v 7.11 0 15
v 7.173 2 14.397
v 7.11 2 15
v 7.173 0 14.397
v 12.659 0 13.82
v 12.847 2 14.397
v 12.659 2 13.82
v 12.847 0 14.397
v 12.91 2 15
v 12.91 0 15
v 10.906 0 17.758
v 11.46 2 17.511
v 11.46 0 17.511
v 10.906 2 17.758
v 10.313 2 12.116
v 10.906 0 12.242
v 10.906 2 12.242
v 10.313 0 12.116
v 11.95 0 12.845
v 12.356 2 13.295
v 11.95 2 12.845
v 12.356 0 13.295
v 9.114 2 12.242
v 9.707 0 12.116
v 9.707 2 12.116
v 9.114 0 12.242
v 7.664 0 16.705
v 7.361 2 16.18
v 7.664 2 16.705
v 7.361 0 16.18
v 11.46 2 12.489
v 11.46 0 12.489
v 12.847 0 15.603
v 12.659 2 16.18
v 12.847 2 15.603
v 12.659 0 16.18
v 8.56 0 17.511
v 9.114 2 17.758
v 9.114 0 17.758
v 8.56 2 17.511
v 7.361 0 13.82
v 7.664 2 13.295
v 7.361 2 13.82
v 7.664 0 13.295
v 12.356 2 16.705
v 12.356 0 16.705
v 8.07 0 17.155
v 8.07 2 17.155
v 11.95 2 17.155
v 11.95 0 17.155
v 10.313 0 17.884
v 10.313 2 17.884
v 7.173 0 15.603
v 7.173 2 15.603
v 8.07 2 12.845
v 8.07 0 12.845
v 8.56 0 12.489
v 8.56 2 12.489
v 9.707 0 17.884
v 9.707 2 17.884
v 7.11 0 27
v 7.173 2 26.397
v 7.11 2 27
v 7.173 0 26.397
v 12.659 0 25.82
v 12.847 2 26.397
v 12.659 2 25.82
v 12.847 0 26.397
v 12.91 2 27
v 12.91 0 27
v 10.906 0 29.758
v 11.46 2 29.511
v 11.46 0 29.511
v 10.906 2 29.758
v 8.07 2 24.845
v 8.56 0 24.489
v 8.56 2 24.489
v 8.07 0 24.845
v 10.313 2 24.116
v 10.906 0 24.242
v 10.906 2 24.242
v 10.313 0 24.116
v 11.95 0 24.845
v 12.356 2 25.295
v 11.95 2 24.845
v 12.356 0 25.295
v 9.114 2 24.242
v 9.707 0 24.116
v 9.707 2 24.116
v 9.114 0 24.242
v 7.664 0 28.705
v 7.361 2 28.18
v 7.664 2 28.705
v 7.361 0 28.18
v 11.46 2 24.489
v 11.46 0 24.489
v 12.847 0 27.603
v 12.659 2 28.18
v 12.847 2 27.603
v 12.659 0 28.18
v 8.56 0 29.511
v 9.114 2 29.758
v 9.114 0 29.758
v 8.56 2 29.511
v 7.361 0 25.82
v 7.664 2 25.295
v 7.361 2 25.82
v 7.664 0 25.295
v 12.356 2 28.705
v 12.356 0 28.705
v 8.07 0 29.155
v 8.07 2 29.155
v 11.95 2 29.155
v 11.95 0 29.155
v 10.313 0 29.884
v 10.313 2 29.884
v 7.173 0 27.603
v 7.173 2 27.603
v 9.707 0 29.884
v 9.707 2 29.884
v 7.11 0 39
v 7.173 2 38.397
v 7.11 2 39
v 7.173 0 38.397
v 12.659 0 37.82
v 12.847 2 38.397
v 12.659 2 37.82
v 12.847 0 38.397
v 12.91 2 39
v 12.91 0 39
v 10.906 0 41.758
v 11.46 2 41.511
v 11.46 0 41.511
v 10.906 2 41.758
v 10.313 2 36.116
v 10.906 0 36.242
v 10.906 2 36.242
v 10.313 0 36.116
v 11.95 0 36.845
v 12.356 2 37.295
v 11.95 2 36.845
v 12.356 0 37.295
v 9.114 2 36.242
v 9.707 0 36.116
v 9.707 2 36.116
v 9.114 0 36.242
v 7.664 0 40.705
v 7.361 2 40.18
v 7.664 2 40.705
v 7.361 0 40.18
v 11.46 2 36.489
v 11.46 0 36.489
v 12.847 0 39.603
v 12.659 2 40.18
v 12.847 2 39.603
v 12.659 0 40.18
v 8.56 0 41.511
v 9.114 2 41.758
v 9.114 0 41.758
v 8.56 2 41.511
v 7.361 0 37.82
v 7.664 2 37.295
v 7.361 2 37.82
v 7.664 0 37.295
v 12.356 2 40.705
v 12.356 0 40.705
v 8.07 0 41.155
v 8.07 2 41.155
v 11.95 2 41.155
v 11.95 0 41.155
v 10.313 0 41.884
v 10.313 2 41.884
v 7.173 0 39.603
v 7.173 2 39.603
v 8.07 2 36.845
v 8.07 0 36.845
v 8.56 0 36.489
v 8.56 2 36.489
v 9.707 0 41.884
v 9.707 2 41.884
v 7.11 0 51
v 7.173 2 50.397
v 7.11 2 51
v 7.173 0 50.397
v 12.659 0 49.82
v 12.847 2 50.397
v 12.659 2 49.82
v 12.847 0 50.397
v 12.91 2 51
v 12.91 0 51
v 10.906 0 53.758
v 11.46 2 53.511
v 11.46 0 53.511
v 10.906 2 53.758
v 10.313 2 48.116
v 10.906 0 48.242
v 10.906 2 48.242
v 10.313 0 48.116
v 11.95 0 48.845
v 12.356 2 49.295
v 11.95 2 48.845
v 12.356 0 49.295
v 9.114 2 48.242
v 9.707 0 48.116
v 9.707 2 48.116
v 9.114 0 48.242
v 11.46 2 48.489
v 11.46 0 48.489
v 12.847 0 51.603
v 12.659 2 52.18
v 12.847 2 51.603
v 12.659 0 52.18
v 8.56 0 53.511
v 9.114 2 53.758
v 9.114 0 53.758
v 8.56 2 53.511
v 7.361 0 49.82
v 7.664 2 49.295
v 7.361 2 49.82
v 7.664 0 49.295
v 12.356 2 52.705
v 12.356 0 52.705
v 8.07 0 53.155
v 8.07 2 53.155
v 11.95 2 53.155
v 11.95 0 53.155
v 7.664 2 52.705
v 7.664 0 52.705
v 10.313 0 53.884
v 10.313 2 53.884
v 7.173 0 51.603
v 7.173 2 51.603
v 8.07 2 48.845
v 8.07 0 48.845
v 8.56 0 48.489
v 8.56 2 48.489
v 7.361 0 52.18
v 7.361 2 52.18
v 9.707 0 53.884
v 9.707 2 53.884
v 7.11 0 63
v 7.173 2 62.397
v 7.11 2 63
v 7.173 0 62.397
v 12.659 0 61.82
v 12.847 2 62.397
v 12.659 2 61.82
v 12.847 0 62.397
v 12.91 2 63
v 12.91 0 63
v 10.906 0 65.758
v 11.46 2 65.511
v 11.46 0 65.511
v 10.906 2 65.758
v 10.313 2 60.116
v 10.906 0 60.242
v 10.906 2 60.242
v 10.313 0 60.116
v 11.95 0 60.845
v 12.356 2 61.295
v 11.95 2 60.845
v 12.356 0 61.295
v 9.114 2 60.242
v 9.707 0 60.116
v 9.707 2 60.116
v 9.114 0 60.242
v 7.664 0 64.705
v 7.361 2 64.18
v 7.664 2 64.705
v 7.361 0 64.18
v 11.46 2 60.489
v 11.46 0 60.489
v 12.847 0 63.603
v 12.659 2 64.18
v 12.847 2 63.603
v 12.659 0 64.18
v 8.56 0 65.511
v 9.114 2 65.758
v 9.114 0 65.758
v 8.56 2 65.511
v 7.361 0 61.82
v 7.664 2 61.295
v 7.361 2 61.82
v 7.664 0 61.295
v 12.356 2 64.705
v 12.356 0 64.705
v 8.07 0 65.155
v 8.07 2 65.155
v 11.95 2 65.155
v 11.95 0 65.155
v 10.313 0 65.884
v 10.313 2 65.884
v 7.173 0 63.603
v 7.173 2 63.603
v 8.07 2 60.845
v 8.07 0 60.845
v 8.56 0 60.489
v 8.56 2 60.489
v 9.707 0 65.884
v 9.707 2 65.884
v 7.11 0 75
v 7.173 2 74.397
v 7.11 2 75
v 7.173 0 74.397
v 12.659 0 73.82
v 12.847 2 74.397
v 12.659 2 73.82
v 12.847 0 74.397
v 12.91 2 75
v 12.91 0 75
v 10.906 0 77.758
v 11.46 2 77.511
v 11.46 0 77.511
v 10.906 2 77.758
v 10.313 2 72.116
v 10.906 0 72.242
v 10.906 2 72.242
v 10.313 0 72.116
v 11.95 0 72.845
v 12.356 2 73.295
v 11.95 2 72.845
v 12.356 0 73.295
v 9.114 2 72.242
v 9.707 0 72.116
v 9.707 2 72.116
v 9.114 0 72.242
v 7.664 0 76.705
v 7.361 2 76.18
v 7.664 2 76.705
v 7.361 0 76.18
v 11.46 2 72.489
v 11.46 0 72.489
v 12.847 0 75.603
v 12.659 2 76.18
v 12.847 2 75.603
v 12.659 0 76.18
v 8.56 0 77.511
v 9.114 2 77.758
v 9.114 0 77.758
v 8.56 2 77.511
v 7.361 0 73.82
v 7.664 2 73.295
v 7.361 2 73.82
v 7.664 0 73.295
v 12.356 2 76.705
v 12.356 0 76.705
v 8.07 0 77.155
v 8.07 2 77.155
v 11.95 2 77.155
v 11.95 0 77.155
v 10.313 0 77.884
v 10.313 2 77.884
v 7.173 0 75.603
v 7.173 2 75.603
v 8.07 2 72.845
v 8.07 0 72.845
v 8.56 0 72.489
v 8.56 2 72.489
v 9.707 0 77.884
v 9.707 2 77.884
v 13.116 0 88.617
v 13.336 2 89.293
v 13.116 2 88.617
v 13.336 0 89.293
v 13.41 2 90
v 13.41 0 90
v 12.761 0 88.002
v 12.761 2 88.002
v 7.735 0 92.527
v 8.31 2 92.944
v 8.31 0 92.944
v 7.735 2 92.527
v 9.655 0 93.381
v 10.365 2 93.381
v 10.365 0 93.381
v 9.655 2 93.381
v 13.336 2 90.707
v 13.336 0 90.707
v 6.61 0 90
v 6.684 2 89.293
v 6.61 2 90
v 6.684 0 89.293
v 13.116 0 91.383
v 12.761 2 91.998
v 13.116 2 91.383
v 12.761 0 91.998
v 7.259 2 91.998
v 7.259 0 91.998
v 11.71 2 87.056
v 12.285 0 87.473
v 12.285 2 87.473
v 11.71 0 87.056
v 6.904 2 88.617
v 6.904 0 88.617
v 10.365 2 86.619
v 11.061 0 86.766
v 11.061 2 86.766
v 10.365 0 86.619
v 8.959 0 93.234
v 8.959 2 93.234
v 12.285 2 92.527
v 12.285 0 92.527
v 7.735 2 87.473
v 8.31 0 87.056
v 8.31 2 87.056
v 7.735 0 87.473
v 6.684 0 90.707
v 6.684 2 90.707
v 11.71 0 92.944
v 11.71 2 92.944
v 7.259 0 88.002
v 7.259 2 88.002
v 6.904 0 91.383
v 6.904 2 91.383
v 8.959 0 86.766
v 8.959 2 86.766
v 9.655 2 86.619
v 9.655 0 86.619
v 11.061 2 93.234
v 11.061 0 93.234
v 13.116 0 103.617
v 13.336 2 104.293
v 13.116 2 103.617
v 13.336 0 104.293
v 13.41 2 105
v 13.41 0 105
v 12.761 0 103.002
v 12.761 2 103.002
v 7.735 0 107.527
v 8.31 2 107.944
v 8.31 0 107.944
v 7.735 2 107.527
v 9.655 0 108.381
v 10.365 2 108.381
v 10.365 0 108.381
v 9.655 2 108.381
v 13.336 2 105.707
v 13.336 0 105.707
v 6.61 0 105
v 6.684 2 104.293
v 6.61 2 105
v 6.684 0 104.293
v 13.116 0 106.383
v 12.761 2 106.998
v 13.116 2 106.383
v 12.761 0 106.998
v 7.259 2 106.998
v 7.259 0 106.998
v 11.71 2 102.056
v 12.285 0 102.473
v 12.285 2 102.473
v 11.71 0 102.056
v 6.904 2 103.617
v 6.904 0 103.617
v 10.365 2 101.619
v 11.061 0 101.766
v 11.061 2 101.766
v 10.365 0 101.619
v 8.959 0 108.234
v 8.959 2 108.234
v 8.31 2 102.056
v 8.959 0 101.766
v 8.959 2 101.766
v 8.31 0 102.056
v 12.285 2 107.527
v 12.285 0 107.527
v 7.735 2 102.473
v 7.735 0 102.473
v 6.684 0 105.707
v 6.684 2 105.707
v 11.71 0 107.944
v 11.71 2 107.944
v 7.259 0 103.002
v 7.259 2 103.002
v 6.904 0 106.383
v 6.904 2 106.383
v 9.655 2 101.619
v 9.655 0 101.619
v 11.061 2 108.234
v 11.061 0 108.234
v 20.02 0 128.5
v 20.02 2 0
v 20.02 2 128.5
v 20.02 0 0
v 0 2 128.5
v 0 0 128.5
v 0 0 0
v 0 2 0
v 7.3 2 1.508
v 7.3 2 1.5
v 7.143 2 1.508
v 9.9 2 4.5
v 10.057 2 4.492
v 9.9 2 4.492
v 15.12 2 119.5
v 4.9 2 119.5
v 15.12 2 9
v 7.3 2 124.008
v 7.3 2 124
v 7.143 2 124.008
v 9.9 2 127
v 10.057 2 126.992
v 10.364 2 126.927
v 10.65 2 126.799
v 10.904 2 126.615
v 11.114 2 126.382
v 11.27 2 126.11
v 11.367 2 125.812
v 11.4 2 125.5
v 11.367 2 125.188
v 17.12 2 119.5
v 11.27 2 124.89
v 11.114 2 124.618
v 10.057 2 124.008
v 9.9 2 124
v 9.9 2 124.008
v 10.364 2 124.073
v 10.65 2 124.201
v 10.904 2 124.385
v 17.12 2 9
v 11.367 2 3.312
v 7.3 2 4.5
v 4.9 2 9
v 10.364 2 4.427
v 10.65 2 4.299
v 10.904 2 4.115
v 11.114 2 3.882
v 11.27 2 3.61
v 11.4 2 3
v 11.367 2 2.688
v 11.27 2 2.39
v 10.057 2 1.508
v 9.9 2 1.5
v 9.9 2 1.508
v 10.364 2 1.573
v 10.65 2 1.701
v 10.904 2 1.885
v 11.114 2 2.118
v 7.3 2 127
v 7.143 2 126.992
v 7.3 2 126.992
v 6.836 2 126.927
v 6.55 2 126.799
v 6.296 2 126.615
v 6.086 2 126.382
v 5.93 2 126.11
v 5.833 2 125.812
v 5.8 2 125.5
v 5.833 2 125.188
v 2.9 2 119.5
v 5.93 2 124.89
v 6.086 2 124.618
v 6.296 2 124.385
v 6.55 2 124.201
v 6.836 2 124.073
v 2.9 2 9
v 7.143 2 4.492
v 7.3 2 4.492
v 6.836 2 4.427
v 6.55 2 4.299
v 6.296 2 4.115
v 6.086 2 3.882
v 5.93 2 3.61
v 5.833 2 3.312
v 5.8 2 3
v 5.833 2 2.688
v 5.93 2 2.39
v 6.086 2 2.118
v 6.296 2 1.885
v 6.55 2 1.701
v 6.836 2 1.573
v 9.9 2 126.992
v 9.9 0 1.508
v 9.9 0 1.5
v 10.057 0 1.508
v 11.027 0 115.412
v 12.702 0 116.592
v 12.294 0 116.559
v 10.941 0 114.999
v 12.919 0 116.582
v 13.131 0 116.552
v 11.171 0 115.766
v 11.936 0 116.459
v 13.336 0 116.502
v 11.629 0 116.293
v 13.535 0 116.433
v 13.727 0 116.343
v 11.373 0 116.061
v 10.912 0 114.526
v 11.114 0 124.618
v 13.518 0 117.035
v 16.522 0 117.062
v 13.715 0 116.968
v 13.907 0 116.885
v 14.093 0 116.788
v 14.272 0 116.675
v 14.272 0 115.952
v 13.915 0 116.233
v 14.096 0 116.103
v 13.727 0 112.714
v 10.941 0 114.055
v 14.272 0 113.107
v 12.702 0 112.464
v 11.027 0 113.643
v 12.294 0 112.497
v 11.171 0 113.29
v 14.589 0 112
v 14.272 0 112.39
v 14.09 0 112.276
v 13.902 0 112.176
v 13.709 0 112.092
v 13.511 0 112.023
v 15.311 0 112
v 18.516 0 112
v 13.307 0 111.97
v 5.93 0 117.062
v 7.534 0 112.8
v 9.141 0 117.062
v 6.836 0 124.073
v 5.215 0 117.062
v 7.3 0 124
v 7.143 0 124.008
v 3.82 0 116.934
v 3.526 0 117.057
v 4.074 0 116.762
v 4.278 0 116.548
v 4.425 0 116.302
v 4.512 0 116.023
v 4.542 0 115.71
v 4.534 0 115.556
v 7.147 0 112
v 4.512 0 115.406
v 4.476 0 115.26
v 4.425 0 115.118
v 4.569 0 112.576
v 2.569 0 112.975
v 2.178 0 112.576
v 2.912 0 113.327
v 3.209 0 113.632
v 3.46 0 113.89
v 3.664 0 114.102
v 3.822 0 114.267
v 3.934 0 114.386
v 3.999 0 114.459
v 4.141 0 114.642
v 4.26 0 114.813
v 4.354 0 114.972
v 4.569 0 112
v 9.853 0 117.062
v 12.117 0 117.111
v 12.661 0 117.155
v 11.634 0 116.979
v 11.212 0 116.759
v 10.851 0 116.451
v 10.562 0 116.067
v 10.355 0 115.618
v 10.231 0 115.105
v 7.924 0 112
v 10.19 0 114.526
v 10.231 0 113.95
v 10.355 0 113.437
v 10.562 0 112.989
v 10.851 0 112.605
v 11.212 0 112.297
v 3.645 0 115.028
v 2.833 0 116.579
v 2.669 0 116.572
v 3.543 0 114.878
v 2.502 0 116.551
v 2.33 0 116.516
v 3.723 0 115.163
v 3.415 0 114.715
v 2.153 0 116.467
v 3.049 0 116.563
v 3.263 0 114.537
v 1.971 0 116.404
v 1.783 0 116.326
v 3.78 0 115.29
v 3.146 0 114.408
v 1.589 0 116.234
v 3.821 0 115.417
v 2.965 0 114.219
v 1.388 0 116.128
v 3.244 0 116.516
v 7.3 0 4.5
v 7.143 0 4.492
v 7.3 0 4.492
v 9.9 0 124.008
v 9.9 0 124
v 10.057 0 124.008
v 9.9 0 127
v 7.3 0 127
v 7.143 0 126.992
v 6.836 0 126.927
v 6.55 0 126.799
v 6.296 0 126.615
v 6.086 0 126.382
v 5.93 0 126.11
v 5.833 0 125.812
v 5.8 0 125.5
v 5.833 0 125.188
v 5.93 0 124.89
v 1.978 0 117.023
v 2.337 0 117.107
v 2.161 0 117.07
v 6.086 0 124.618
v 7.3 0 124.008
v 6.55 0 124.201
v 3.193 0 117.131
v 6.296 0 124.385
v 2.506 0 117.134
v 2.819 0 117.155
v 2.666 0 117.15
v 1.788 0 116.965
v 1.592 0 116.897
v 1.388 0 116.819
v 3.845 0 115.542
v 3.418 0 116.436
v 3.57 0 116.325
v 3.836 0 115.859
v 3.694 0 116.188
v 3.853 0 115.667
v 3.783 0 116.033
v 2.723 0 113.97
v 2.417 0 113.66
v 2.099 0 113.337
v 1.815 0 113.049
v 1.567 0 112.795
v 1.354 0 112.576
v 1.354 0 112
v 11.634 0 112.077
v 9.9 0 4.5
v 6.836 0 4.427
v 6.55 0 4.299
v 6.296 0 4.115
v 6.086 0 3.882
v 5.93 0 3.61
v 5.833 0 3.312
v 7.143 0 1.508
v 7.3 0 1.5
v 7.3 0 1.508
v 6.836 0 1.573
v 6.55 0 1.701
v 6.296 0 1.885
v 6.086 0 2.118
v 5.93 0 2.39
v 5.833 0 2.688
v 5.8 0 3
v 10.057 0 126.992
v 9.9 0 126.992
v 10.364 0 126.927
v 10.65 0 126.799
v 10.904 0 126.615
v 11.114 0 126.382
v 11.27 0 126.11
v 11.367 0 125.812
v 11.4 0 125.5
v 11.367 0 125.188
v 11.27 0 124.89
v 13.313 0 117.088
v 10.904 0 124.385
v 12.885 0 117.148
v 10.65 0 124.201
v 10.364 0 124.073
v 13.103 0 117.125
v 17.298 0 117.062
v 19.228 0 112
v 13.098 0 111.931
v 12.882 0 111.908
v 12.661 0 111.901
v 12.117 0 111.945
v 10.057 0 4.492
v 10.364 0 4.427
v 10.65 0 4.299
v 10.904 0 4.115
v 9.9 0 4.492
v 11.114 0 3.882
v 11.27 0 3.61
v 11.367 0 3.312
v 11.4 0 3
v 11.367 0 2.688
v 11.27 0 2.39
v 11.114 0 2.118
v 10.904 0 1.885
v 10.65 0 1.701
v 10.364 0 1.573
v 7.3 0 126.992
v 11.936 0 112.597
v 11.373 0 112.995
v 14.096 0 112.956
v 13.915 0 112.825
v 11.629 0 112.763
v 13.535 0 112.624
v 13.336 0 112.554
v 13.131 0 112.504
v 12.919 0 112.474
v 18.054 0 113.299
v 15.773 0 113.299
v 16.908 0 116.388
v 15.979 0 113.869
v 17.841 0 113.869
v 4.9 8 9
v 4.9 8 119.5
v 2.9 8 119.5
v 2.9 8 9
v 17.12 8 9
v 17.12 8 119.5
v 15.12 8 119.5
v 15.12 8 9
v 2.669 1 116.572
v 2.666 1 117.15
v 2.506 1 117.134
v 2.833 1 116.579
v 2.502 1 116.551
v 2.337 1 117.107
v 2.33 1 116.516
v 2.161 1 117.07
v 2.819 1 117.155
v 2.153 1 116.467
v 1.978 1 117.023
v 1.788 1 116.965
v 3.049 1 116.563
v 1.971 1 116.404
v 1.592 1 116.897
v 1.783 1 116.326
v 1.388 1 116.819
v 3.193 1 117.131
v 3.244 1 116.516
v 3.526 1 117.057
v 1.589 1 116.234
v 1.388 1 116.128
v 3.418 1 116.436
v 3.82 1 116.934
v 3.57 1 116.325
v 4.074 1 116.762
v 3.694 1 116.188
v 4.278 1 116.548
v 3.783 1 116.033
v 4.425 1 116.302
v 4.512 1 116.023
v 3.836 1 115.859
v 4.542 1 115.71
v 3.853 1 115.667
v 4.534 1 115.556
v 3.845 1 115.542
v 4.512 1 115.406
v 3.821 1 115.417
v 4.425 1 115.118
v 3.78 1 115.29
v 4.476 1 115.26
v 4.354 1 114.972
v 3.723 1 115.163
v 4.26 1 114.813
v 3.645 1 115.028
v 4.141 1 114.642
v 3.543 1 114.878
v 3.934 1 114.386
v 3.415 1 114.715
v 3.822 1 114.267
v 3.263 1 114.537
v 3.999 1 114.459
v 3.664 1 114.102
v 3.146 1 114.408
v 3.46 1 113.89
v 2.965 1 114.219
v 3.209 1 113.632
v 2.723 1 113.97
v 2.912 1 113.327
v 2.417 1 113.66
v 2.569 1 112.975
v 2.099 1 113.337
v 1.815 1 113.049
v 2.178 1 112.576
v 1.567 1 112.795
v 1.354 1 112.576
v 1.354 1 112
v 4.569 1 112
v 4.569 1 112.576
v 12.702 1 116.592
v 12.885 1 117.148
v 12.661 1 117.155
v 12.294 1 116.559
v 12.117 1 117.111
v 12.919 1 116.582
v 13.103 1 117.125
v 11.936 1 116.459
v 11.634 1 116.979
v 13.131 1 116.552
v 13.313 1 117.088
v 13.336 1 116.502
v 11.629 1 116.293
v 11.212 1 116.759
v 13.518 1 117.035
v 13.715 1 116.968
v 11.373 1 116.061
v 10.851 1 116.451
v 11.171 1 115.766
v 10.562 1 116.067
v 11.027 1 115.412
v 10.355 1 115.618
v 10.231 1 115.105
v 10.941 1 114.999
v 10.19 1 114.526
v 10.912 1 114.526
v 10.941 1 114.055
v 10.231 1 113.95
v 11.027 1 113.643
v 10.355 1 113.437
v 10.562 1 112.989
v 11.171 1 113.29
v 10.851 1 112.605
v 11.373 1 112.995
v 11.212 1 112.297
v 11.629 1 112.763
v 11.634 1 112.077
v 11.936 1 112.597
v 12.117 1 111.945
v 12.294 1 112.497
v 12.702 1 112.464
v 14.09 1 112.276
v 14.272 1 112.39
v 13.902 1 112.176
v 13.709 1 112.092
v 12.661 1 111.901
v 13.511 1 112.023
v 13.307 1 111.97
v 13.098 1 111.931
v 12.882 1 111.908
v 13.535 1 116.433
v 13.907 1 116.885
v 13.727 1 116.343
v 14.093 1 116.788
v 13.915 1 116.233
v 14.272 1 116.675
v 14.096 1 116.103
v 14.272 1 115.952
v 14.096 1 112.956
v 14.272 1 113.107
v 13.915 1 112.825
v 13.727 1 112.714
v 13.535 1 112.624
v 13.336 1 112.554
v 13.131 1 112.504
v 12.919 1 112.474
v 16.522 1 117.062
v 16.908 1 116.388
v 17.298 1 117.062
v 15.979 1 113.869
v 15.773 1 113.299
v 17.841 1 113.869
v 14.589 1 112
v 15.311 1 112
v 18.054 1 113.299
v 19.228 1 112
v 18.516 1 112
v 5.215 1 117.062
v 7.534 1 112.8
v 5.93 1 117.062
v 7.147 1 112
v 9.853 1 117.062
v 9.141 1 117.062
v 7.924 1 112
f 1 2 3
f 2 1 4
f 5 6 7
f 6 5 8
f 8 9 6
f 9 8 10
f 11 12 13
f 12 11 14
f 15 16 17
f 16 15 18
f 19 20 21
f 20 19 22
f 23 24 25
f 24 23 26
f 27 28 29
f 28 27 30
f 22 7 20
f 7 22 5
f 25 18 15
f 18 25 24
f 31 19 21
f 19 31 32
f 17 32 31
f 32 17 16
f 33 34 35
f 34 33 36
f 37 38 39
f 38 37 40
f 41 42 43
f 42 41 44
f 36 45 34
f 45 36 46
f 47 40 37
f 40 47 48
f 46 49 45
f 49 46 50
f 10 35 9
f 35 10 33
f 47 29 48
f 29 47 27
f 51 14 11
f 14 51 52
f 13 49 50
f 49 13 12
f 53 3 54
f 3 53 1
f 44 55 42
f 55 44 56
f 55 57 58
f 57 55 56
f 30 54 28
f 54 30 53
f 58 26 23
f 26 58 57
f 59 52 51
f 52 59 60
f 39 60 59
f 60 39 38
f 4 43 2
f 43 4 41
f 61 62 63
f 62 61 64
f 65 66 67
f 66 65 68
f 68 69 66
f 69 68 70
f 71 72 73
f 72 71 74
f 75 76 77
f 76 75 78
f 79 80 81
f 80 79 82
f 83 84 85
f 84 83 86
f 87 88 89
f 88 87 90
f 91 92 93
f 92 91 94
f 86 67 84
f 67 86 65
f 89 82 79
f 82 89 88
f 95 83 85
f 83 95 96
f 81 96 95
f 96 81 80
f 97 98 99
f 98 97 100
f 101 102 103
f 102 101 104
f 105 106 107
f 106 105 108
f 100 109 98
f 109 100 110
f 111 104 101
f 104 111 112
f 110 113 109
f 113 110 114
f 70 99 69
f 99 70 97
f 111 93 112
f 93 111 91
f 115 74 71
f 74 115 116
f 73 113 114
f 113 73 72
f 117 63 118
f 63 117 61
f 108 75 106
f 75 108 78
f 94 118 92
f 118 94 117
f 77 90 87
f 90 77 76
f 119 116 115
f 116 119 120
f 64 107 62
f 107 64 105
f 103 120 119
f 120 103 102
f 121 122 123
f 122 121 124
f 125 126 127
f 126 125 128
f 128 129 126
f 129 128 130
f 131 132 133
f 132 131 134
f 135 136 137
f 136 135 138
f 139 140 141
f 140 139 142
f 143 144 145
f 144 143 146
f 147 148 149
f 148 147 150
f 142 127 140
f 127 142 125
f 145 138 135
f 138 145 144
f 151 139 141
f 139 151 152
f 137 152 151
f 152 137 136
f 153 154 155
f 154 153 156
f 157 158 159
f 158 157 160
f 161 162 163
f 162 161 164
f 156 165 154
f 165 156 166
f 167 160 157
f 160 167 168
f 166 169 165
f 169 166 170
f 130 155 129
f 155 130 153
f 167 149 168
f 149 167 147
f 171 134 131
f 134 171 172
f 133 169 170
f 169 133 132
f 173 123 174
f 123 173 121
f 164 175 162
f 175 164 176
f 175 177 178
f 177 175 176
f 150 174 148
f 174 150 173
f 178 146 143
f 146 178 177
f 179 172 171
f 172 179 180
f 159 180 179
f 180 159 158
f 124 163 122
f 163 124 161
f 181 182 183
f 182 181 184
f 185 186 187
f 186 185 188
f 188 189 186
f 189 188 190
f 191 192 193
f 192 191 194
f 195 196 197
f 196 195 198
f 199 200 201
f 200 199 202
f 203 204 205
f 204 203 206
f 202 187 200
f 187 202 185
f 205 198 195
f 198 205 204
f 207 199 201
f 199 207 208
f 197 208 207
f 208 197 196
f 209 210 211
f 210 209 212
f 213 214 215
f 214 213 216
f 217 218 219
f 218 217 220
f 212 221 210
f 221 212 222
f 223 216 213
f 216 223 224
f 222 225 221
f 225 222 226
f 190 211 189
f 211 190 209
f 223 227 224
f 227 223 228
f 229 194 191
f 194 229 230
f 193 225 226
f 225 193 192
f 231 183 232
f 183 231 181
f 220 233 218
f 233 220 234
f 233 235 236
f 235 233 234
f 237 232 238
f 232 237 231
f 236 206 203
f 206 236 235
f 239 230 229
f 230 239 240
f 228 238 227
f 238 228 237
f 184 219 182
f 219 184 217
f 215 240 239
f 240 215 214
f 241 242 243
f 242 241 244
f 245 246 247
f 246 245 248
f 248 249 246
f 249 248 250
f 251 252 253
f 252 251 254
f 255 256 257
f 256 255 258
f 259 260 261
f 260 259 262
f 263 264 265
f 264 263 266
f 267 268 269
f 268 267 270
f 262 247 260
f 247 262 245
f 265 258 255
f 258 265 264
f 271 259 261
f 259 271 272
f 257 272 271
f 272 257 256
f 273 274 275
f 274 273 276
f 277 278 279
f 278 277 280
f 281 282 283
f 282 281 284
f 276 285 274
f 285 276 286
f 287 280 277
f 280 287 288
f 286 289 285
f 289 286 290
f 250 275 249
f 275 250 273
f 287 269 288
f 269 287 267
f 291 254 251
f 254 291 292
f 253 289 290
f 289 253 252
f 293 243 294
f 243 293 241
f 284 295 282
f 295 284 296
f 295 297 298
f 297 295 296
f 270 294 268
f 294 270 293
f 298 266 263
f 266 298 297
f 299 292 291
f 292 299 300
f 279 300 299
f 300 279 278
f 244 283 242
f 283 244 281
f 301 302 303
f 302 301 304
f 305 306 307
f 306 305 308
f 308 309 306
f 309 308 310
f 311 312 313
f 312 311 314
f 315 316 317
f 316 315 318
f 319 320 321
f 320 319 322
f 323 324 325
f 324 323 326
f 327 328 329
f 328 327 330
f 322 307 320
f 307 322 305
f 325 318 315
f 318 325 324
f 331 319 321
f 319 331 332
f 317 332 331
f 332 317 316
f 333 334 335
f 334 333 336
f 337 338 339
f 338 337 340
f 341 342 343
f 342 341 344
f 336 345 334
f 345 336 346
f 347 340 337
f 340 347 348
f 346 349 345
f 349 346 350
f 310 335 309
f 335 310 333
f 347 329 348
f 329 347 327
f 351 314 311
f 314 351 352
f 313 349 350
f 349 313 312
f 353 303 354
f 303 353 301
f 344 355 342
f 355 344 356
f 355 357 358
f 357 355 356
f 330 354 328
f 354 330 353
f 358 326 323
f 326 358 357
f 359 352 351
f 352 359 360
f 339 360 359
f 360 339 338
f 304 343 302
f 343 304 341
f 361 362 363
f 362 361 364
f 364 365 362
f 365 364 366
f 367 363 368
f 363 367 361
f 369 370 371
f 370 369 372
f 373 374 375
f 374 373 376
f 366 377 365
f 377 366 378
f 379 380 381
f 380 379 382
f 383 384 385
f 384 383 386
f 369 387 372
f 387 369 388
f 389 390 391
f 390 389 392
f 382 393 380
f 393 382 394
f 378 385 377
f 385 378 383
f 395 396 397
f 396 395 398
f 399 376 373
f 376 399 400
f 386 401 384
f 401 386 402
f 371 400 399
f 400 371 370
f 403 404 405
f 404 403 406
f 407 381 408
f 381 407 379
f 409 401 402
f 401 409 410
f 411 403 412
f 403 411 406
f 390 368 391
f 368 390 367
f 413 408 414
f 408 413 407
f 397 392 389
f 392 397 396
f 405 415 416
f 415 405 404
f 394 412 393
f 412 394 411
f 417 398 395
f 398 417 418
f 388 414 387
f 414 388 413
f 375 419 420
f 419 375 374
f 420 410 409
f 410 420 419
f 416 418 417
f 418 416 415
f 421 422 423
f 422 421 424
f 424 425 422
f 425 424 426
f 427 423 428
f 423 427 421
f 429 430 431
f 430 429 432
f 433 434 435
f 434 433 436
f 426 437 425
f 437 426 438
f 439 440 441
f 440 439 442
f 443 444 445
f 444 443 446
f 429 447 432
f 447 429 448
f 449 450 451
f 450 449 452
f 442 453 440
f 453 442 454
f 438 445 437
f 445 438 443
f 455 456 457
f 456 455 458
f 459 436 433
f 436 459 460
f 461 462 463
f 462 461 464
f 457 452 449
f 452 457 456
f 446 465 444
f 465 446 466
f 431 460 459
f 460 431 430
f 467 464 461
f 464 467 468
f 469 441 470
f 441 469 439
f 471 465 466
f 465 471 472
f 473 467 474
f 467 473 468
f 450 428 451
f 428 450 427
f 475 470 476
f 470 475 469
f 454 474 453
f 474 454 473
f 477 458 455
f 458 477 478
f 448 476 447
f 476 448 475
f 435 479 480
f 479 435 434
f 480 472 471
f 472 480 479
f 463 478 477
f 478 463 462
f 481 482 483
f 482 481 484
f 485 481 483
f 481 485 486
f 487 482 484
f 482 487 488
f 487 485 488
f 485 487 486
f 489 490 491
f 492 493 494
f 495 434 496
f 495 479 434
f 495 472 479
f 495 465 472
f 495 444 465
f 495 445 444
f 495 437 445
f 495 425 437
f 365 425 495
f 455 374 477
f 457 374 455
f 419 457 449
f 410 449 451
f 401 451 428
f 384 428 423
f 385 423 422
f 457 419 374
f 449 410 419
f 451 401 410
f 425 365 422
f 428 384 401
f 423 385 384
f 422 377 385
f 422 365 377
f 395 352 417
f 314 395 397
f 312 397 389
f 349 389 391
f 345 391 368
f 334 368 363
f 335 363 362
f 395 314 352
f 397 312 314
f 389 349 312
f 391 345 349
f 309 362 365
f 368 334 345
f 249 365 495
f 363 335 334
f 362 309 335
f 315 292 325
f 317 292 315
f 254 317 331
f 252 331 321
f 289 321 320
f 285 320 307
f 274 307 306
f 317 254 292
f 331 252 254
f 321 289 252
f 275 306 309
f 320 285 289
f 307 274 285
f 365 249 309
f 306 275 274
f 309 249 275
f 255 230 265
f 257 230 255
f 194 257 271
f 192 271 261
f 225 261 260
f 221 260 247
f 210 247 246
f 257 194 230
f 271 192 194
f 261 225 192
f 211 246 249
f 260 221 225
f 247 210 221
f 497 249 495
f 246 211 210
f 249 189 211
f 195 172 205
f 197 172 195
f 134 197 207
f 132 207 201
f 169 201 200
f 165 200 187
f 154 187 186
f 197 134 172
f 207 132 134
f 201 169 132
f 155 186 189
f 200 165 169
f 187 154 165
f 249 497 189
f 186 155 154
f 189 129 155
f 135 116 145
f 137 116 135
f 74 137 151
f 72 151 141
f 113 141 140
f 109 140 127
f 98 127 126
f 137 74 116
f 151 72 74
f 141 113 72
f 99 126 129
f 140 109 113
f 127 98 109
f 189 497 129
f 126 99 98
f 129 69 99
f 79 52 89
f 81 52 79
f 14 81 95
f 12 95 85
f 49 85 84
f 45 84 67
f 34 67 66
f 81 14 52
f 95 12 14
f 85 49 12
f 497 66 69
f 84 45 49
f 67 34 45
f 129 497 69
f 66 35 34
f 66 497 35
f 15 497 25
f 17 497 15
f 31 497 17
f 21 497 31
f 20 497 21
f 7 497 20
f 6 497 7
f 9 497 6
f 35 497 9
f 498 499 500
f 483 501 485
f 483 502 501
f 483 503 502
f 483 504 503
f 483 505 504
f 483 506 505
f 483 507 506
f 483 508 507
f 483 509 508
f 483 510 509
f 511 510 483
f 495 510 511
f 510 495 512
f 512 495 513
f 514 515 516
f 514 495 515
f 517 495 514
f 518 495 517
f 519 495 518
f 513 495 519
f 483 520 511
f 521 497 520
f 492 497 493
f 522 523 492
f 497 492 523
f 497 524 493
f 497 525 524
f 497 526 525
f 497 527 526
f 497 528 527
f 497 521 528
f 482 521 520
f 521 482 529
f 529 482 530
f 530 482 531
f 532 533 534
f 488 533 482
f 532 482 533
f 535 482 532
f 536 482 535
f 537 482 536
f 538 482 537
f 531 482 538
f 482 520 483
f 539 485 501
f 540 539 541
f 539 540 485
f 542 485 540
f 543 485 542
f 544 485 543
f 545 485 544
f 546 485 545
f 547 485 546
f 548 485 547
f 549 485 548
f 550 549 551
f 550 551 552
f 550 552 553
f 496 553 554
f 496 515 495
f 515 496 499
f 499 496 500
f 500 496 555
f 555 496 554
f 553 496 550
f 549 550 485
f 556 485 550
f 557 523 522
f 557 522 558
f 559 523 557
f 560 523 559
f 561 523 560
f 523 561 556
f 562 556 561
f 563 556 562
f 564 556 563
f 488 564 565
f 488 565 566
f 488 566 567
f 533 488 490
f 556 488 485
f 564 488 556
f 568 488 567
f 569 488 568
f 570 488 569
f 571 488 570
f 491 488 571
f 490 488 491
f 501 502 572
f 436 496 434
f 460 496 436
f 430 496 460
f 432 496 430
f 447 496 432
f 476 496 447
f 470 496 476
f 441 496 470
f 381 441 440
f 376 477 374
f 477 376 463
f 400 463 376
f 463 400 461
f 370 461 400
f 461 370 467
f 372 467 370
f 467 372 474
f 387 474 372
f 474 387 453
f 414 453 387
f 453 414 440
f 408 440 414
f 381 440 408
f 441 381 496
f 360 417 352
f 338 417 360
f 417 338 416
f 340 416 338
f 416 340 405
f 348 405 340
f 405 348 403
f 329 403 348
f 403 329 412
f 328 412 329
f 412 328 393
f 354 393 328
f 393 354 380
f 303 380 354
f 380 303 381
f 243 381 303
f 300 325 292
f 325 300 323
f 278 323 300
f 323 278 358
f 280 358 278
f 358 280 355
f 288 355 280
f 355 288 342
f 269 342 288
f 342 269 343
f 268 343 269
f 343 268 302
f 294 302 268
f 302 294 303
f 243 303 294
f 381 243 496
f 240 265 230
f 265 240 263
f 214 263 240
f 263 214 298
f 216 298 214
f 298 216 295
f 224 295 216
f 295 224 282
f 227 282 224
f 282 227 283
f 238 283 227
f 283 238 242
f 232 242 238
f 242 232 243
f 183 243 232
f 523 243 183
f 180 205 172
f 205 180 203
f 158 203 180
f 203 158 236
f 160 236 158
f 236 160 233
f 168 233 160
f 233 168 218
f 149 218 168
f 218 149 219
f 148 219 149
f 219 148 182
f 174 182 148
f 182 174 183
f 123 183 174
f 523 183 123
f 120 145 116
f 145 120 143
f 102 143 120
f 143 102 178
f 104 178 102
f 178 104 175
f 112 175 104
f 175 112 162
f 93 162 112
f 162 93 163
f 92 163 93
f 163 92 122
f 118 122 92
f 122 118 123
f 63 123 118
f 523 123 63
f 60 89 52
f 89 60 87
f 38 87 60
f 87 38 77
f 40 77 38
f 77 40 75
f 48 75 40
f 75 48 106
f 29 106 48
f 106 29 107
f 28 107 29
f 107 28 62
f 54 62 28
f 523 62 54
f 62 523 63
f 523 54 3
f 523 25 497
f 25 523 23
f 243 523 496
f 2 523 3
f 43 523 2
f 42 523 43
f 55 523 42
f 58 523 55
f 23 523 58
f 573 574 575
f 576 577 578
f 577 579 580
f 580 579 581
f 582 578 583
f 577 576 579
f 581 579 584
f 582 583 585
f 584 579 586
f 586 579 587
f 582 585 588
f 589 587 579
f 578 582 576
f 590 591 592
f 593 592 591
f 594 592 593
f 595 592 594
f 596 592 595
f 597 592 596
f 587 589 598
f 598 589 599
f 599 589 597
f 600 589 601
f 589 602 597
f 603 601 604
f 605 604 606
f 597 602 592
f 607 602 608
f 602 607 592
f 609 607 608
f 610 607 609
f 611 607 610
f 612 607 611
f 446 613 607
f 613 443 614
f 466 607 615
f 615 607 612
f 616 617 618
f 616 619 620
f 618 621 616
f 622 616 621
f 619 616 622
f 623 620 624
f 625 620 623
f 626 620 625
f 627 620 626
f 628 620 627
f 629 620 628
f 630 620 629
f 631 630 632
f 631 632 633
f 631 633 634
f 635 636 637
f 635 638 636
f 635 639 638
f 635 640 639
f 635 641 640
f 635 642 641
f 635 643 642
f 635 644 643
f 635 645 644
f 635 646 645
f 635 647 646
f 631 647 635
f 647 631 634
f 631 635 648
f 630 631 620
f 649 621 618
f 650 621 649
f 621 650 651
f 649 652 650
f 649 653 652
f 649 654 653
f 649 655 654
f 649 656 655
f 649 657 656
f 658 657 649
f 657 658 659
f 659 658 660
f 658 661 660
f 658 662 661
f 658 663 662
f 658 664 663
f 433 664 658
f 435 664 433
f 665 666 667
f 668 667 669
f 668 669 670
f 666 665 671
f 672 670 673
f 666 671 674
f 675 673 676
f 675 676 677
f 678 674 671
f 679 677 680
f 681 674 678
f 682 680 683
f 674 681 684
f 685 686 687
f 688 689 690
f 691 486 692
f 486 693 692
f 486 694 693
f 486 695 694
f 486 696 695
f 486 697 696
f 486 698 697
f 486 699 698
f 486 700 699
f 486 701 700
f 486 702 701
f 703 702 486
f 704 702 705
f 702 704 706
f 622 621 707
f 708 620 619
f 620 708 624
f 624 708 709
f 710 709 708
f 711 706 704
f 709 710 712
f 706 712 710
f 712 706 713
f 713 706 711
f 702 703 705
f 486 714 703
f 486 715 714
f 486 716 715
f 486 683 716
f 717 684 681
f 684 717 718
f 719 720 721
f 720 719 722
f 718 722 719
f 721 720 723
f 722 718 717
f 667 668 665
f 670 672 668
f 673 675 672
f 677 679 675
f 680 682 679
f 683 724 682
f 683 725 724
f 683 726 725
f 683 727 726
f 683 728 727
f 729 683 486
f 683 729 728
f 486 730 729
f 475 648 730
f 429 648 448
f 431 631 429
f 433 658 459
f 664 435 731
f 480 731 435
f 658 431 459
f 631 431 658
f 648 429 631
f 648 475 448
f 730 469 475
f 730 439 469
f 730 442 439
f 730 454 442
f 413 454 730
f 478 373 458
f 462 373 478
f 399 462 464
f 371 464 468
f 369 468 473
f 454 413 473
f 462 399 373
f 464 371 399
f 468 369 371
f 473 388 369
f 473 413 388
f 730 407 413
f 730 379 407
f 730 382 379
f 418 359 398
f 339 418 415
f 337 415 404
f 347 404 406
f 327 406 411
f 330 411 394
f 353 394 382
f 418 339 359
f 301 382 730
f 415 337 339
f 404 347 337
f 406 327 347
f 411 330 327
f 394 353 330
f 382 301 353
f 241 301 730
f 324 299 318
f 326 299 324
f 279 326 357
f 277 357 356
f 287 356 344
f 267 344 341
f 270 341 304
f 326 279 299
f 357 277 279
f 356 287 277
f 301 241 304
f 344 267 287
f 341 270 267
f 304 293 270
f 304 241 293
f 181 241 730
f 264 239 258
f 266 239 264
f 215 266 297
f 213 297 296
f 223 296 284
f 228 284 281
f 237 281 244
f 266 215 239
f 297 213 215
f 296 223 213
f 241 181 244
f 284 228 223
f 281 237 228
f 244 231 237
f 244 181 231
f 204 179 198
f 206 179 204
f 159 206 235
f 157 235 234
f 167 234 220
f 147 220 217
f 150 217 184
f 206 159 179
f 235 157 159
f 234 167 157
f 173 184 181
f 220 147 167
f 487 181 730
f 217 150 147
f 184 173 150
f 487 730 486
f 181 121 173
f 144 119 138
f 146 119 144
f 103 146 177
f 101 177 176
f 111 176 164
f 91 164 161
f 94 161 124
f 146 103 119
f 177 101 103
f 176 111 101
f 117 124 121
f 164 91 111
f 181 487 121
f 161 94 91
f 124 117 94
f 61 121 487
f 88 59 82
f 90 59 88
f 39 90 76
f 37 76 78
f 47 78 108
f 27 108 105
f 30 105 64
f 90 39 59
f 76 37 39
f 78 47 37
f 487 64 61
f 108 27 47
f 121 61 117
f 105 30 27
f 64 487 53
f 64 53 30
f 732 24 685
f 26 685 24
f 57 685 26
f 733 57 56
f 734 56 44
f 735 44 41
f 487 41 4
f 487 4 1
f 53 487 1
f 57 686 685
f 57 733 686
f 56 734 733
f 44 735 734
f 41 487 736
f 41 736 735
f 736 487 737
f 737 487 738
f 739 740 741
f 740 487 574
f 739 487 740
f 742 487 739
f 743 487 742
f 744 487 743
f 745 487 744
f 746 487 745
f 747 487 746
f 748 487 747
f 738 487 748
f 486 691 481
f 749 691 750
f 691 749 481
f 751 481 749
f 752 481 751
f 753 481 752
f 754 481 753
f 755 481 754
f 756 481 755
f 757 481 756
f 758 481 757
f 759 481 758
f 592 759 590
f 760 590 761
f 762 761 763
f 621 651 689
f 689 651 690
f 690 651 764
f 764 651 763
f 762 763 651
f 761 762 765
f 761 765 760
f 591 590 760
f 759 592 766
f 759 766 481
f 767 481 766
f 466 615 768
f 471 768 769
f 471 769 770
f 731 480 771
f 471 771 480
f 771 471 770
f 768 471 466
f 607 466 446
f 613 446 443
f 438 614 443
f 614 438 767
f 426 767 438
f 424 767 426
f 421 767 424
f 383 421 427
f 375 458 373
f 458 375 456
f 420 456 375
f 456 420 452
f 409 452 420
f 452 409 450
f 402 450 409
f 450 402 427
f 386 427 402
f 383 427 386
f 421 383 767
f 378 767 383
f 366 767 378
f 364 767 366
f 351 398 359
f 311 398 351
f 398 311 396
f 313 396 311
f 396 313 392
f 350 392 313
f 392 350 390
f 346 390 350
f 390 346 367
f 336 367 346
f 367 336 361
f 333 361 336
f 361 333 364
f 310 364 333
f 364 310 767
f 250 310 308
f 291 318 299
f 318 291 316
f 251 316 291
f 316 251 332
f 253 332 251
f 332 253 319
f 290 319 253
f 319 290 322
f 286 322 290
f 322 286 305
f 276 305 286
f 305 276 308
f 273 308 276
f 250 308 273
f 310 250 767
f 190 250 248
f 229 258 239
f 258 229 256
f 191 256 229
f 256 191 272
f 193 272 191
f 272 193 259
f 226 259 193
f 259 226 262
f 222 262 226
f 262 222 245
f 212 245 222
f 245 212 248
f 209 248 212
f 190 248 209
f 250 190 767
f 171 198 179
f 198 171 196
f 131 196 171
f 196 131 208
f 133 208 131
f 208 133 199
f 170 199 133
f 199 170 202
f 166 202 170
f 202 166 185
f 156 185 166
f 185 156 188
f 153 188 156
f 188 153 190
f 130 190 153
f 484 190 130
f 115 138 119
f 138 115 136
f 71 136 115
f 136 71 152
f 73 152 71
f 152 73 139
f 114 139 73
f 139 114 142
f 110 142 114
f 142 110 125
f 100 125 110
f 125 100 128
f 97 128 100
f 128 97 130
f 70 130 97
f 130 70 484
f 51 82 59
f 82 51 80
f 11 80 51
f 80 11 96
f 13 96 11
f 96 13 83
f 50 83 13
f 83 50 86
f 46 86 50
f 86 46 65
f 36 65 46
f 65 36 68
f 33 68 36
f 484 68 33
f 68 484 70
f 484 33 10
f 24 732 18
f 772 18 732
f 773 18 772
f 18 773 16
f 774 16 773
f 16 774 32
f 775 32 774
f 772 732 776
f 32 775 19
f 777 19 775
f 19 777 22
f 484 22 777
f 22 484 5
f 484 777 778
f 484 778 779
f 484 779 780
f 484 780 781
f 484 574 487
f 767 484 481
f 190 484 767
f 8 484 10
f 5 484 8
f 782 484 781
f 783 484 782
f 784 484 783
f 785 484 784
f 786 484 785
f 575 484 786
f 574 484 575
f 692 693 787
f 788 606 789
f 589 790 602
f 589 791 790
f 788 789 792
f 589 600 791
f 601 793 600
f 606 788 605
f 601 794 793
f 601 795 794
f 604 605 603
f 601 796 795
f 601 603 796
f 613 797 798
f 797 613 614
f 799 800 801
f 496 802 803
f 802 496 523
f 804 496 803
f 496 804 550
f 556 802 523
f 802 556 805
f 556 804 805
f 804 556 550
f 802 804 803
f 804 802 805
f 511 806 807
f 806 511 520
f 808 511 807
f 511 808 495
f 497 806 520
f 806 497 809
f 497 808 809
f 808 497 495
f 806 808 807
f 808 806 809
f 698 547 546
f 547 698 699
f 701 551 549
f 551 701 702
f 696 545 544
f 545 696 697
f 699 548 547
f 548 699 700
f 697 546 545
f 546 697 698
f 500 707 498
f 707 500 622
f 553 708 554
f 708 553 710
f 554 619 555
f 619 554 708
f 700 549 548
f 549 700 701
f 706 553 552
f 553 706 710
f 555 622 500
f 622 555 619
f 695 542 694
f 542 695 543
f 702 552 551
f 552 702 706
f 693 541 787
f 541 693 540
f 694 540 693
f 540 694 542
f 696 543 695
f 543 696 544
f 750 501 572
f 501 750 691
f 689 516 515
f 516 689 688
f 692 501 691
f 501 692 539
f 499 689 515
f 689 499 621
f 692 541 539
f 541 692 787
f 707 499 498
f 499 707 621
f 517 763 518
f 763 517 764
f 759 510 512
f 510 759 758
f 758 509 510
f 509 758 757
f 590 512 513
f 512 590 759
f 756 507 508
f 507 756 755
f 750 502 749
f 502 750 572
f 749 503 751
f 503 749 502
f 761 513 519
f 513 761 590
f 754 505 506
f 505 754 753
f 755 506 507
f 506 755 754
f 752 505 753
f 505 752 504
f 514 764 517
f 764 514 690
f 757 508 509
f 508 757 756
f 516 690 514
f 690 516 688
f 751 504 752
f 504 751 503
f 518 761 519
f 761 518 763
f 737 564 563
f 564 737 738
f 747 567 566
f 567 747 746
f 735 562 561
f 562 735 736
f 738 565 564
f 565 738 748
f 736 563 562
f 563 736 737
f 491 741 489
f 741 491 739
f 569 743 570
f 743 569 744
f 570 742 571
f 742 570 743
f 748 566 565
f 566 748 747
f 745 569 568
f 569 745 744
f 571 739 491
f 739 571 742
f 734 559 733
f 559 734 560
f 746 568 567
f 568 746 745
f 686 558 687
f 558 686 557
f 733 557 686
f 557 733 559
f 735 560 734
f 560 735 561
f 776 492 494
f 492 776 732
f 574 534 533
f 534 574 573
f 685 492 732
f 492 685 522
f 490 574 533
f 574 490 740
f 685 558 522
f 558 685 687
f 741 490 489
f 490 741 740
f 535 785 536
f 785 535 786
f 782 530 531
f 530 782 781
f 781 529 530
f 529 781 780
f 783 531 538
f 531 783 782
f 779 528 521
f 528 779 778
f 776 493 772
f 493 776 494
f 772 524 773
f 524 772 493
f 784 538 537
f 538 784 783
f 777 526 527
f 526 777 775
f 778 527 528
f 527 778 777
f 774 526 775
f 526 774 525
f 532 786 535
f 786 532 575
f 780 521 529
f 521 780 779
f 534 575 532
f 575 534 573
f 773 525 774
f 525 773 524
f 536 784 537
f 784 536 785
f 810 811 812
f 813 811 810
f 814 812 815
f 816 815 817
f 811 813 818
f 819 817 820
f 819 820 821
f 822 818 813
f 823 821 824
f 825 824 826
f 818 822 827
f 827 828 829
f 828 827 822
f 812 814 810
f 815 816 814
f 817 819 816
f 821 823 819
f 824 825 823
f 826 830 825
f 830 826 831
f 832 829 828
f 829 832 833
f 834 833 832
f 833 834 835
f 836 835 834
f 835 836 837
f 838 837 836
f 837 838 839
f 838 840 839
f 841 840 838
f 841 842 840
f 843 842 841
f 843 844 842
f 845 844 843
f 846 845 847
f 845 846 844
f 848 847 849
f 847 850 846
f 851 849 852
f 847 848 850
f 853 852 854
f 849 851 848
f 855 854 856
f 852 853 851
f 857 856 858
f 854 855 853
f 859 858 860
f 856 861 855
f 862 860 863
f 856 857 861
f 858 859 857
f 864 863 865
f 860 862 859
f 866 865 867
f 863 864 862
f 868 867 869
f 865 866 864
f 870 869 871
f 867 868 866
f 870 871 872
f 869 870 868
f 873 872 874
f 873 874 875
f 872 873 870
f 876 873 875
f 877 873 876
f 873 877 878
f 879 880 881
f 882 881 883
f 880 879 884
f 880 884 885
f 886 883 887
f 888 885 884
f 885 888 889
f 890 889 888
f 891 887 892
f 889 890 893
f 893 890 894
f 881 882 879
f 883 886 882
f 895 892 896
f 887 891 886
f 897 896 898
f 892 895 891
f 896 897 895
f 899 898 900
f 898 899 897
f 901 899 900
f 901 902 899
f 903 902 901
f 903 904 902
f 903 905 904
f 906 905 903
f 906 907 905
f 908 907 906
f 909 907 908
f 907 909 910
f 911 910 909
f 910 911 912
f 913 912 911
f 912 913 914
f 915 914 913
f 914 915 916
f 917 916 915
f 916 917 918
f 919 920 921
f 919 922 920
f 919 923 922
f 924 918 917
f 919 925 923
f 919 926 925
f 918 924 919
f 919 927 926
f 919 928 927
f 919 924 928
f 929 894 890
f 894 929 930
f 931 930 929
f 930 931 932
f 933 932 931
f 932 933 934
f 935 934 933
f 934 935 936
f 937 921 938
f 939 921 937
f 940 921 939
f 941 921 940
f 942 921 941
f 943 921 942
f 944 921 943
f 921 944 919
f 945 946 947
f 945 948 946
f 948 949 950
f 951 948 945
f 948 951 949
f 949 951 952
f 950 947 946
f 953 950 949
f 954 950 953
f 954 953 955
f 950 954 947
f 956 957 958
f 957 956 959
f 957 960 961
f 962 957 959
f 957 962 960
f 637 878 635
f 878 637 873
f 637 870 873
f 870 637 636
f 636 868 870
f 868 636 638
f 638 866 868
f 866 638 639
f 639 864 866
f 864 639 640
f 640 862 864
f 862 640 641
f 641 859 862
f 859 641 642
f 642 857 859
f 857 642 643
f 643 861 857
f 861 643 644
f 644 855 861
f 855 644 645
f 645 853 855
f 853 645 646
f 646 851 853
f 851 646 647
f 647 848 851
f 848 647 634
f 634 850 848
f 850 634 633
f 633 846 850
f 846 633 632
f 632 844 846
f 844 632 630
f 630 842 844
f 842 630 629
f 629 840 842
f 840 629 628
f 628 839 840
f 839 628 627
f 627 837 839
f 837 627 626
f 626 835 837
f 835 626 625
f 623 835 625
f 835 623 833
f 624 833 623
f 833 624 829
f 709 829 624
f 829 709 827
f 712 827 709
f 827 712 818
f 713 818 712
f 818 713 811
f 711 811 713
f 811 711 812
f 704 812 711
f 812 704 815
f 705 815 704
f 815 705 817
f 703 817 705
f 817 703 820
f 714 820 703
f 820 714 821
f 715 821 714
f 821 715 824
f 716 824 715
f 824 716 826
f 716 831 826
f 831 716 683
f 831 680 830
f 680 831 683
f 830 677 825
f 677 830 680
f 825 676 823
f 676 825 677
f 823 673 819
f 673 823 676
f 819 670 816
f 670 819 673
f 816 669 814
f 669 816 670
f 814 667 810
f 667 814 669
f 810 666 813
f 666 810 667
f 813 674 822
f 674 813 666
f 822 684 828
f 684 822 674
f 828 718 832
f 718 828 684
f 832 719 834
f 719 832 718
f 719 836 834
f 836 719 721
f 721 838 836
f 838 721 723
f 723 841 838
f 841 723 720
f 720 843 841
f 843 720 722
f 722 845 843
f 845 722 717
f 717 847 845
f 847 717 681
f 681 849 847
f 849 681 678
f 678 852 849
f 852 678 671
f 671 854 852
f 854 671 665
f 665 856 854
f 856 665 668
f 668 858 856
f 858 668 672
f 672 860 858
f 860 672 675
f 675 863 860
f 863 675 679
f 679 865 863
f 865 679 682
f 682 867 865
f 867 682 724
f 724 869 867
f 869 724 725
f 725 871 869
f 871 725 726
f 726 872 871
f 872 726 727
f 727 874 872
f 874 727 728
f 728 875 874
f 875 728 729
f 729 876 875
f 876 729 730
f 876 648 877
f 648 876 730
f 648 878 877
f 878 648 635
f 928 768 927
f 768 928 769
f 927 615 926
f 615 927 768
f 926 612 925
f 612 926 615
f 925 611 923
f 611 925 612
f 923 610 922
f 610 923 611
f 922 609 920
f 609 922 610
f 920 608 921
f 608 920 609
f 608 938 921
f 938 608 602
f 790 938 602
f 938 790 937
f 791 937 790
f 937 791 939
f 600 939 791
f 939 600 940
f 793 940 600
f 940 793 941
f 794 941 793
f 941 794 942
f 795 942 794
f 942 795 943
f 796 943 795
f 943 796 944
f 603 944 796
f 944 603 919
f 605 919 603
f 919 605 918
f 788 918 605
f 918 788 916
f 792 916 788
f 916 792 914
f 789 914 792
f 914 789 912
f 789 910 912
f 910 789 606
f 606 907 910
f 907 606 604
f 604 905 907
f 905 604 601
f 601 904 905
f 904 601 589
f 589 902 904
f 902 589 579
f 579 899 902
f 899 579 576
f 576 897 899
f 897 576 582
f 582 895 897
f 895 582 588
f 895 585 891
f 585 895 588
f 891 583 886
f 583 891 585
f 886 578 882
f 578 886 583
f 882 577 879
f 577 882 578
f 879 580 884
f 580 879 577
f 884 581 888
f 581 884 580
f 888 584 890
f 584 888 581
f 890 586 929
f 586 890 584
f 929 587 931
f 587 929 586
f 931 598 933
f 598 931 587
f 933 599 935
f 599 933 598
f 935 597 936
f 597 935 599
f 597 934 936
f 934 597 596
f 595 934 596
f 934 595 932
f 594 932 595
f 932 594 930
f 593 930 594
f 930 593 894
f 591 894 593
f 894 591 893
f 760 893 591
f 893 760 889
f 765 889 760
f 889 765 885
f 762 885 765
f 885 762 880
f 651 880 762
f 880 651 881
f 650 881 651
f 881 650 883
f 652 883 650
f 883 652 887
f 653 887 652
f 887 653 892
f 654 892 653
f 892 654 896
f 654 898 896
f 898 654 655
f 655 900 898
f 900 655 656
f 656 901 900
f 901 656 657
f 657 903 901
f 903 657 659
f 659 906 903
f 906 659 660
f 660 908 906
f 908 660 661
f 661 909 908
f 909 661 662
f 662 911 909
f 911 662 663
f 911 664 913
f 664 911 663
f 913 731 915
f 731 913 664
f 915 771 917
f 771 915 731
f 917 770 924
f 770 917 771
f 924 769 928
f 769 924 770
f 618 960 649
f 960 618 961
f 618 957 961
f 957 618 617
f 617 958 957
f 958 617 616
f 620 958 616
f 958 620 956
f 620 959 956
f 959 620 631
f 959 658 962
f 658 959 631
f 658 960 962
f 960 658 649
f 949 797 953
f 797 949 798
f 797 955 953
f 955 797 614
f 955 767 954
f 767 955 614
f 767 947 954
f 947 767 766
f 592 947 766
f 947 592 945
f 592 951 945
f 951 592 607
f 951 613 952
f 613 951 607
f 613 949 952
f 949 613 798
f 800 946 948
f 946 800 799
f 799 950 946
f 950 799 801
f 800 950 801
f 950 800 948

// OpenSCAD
//!OpenSCAD

// from https://www.blockscad3d.com/community/projects/718412

module hole_for_switch() {
  hole_in_front_plate(switch_dia);
}

module hole_for_potentiometer() {
  hole_in_front_plate(pot_dia);
}

module hole_for_jack() {
  hole_in_front_plate(jack_dia);
}

module hole_in_front_plate(diameter) {
  translate([0,-y2/2,0])
  rotate([270, 0, 0]){
    cylinder(r1=diameter/2, r2=diameter/2, h=y2*2, center=false);
  }
}

module make_face_plate() {
  difference() {
    cube([x1, y2, z1], center=false);

    union() {
        for (i=[0:5]) {
            translate([x1/2, 0, (15 + i * 12)]){
                hole_for_jack();
            }
        }
        for (i=[0:1]) {
            translate([x1/2, 0, (90 + i * 15)]){
                hole_for_potentiometer();
            }
        }
      
    //   translate([15, 0, (20 + 1 * 17.78)]){
    //     hole_for_jack();
    //   }
    //   translate([15, 0, (20 + 2 * 17.78)]){
    //     hole_for_jack();
    //   }
    //   translate([(15 + 17.78), 0, (20 + 0 * 17.78)]){
    //     hole_for_jack();
    //   }
    //   translate([(15 + 17.78), 0, (20 + 1 * 17.78)]){
    //     hole_for_potentiometer();
    //   }
    //   translate([(15 + 17.78), 0, (20 + 2 * 17.78)]){
    //     hole_for_potentiometer();
    //   }
    //   translate([(15 + 17.78), 0, (20 + 3 * 17.78)]){
    //     hole_for_potentiometer();
    //   }
    }
  }
}

module make_slot_pair() {
  union(){
    translate([0, 0, (z1 - z4)]){
      make_slot();
    }
    translate([0, 0, z4]){
      make_slot();
    }
  }
}

module make_right_slot_pair() {
  translate([(x4 + 5.08 * (Width_HP - 4)), 0, 0]){
    union(){
      translate([0, 0, (z1 - z4)]){
        make_slot();
      }
      translate([0, 0, z4]){
        make_slot();
      }
    }
  }
}

module make_slot() {
  translate([0,-y2/2,0])
  union(){
    translate([x5, 0, 0]){
      rotate([270, 0, 0]){
        cylinder(r1=(z3 / 2), r2=(z3 / 2), h=y2*2, center=false);
      }
    }
    translate([x4, 0, 0]){
      rotate([270, 0, 0]){
        cylinder(r1=(z3 / 2), r2=(z3 / 2), h=y2*2, center=false);
      }
      translate([0, 0, ((z3 / 2) * -1)]){
        cube([(x5 - x4), y2*2, z3], center=false);
      }
    }
  }
}

module left_stiffening_rib() {
  translate([x2, 0, ((z1 - z2) / 2)]){
    cube([x3, y1, z2], center=false);
  }
}

module right_stiffening_rib() {
  translate([((x1 - x3) - x2), 0, ((z1 - z2) / 2)]){
    cube([x3, y1, z2], center=false);
  }
}

module panel_label(label) {
  translate([x1/2,0,112])
  translate([0,text_depth,0])
  rotate([90, 0, 0])
  linear_extrude(height=3)
    text(label, 5, "Krungthep", halign="center" );
}

Width_HP = 4;
jack_dia = 5.8;
pot_dia = 6.8;  // knob dia is 12.9
switch_dia = 4.75;
text_depth = 1;

// make round shapes more fine
$fs = 0.1;

// panel dimensions
// these will likely stay the same one dialed in
x1 = Width_HP * 5.08 - 0.3; // width of the front plate
x2 = 2.9; // inset of the stiffening ribs behind the front plate from the edges
x3 = 2;   // width of the stiffening ribs
x4 = 7.3; // distance to center of left-hand radius of mounting slot
x5 = 9.9; // distance to center of right-hand radius of mounting slot
y1 = 8;  // height of stiffening ribs (distance they extend back into the rack)
y2 = 2;   // thickness of front plate
z1 = 128.5; // height of the plate
z2 = 110.5; // length of the stiffening ribs (vertical distance)
z3 = 3;   // radius of mounting slots
z4 = 3;   // distance to center of radius/slot from lower edge of front plate
difference() {
  // all the positive stuff
  union() {
    make_face_plate();
    if (Width_HP > 10) {
        right_stiffening_rib();
    }
    left_stiffening_rib();
    right_stiffening_rib();
  }

  // cutouts
  // add a second set of mounting slots if larger than 10hp
  if (Width_HP <= 10) {
    make_slot_pair();
  } else {
    union(){
      make_right_slot_pair();
      make_slot_pair();
    }
  }
  echo("Final panel width: ", x1);

  panel_label("2VCA");
}
